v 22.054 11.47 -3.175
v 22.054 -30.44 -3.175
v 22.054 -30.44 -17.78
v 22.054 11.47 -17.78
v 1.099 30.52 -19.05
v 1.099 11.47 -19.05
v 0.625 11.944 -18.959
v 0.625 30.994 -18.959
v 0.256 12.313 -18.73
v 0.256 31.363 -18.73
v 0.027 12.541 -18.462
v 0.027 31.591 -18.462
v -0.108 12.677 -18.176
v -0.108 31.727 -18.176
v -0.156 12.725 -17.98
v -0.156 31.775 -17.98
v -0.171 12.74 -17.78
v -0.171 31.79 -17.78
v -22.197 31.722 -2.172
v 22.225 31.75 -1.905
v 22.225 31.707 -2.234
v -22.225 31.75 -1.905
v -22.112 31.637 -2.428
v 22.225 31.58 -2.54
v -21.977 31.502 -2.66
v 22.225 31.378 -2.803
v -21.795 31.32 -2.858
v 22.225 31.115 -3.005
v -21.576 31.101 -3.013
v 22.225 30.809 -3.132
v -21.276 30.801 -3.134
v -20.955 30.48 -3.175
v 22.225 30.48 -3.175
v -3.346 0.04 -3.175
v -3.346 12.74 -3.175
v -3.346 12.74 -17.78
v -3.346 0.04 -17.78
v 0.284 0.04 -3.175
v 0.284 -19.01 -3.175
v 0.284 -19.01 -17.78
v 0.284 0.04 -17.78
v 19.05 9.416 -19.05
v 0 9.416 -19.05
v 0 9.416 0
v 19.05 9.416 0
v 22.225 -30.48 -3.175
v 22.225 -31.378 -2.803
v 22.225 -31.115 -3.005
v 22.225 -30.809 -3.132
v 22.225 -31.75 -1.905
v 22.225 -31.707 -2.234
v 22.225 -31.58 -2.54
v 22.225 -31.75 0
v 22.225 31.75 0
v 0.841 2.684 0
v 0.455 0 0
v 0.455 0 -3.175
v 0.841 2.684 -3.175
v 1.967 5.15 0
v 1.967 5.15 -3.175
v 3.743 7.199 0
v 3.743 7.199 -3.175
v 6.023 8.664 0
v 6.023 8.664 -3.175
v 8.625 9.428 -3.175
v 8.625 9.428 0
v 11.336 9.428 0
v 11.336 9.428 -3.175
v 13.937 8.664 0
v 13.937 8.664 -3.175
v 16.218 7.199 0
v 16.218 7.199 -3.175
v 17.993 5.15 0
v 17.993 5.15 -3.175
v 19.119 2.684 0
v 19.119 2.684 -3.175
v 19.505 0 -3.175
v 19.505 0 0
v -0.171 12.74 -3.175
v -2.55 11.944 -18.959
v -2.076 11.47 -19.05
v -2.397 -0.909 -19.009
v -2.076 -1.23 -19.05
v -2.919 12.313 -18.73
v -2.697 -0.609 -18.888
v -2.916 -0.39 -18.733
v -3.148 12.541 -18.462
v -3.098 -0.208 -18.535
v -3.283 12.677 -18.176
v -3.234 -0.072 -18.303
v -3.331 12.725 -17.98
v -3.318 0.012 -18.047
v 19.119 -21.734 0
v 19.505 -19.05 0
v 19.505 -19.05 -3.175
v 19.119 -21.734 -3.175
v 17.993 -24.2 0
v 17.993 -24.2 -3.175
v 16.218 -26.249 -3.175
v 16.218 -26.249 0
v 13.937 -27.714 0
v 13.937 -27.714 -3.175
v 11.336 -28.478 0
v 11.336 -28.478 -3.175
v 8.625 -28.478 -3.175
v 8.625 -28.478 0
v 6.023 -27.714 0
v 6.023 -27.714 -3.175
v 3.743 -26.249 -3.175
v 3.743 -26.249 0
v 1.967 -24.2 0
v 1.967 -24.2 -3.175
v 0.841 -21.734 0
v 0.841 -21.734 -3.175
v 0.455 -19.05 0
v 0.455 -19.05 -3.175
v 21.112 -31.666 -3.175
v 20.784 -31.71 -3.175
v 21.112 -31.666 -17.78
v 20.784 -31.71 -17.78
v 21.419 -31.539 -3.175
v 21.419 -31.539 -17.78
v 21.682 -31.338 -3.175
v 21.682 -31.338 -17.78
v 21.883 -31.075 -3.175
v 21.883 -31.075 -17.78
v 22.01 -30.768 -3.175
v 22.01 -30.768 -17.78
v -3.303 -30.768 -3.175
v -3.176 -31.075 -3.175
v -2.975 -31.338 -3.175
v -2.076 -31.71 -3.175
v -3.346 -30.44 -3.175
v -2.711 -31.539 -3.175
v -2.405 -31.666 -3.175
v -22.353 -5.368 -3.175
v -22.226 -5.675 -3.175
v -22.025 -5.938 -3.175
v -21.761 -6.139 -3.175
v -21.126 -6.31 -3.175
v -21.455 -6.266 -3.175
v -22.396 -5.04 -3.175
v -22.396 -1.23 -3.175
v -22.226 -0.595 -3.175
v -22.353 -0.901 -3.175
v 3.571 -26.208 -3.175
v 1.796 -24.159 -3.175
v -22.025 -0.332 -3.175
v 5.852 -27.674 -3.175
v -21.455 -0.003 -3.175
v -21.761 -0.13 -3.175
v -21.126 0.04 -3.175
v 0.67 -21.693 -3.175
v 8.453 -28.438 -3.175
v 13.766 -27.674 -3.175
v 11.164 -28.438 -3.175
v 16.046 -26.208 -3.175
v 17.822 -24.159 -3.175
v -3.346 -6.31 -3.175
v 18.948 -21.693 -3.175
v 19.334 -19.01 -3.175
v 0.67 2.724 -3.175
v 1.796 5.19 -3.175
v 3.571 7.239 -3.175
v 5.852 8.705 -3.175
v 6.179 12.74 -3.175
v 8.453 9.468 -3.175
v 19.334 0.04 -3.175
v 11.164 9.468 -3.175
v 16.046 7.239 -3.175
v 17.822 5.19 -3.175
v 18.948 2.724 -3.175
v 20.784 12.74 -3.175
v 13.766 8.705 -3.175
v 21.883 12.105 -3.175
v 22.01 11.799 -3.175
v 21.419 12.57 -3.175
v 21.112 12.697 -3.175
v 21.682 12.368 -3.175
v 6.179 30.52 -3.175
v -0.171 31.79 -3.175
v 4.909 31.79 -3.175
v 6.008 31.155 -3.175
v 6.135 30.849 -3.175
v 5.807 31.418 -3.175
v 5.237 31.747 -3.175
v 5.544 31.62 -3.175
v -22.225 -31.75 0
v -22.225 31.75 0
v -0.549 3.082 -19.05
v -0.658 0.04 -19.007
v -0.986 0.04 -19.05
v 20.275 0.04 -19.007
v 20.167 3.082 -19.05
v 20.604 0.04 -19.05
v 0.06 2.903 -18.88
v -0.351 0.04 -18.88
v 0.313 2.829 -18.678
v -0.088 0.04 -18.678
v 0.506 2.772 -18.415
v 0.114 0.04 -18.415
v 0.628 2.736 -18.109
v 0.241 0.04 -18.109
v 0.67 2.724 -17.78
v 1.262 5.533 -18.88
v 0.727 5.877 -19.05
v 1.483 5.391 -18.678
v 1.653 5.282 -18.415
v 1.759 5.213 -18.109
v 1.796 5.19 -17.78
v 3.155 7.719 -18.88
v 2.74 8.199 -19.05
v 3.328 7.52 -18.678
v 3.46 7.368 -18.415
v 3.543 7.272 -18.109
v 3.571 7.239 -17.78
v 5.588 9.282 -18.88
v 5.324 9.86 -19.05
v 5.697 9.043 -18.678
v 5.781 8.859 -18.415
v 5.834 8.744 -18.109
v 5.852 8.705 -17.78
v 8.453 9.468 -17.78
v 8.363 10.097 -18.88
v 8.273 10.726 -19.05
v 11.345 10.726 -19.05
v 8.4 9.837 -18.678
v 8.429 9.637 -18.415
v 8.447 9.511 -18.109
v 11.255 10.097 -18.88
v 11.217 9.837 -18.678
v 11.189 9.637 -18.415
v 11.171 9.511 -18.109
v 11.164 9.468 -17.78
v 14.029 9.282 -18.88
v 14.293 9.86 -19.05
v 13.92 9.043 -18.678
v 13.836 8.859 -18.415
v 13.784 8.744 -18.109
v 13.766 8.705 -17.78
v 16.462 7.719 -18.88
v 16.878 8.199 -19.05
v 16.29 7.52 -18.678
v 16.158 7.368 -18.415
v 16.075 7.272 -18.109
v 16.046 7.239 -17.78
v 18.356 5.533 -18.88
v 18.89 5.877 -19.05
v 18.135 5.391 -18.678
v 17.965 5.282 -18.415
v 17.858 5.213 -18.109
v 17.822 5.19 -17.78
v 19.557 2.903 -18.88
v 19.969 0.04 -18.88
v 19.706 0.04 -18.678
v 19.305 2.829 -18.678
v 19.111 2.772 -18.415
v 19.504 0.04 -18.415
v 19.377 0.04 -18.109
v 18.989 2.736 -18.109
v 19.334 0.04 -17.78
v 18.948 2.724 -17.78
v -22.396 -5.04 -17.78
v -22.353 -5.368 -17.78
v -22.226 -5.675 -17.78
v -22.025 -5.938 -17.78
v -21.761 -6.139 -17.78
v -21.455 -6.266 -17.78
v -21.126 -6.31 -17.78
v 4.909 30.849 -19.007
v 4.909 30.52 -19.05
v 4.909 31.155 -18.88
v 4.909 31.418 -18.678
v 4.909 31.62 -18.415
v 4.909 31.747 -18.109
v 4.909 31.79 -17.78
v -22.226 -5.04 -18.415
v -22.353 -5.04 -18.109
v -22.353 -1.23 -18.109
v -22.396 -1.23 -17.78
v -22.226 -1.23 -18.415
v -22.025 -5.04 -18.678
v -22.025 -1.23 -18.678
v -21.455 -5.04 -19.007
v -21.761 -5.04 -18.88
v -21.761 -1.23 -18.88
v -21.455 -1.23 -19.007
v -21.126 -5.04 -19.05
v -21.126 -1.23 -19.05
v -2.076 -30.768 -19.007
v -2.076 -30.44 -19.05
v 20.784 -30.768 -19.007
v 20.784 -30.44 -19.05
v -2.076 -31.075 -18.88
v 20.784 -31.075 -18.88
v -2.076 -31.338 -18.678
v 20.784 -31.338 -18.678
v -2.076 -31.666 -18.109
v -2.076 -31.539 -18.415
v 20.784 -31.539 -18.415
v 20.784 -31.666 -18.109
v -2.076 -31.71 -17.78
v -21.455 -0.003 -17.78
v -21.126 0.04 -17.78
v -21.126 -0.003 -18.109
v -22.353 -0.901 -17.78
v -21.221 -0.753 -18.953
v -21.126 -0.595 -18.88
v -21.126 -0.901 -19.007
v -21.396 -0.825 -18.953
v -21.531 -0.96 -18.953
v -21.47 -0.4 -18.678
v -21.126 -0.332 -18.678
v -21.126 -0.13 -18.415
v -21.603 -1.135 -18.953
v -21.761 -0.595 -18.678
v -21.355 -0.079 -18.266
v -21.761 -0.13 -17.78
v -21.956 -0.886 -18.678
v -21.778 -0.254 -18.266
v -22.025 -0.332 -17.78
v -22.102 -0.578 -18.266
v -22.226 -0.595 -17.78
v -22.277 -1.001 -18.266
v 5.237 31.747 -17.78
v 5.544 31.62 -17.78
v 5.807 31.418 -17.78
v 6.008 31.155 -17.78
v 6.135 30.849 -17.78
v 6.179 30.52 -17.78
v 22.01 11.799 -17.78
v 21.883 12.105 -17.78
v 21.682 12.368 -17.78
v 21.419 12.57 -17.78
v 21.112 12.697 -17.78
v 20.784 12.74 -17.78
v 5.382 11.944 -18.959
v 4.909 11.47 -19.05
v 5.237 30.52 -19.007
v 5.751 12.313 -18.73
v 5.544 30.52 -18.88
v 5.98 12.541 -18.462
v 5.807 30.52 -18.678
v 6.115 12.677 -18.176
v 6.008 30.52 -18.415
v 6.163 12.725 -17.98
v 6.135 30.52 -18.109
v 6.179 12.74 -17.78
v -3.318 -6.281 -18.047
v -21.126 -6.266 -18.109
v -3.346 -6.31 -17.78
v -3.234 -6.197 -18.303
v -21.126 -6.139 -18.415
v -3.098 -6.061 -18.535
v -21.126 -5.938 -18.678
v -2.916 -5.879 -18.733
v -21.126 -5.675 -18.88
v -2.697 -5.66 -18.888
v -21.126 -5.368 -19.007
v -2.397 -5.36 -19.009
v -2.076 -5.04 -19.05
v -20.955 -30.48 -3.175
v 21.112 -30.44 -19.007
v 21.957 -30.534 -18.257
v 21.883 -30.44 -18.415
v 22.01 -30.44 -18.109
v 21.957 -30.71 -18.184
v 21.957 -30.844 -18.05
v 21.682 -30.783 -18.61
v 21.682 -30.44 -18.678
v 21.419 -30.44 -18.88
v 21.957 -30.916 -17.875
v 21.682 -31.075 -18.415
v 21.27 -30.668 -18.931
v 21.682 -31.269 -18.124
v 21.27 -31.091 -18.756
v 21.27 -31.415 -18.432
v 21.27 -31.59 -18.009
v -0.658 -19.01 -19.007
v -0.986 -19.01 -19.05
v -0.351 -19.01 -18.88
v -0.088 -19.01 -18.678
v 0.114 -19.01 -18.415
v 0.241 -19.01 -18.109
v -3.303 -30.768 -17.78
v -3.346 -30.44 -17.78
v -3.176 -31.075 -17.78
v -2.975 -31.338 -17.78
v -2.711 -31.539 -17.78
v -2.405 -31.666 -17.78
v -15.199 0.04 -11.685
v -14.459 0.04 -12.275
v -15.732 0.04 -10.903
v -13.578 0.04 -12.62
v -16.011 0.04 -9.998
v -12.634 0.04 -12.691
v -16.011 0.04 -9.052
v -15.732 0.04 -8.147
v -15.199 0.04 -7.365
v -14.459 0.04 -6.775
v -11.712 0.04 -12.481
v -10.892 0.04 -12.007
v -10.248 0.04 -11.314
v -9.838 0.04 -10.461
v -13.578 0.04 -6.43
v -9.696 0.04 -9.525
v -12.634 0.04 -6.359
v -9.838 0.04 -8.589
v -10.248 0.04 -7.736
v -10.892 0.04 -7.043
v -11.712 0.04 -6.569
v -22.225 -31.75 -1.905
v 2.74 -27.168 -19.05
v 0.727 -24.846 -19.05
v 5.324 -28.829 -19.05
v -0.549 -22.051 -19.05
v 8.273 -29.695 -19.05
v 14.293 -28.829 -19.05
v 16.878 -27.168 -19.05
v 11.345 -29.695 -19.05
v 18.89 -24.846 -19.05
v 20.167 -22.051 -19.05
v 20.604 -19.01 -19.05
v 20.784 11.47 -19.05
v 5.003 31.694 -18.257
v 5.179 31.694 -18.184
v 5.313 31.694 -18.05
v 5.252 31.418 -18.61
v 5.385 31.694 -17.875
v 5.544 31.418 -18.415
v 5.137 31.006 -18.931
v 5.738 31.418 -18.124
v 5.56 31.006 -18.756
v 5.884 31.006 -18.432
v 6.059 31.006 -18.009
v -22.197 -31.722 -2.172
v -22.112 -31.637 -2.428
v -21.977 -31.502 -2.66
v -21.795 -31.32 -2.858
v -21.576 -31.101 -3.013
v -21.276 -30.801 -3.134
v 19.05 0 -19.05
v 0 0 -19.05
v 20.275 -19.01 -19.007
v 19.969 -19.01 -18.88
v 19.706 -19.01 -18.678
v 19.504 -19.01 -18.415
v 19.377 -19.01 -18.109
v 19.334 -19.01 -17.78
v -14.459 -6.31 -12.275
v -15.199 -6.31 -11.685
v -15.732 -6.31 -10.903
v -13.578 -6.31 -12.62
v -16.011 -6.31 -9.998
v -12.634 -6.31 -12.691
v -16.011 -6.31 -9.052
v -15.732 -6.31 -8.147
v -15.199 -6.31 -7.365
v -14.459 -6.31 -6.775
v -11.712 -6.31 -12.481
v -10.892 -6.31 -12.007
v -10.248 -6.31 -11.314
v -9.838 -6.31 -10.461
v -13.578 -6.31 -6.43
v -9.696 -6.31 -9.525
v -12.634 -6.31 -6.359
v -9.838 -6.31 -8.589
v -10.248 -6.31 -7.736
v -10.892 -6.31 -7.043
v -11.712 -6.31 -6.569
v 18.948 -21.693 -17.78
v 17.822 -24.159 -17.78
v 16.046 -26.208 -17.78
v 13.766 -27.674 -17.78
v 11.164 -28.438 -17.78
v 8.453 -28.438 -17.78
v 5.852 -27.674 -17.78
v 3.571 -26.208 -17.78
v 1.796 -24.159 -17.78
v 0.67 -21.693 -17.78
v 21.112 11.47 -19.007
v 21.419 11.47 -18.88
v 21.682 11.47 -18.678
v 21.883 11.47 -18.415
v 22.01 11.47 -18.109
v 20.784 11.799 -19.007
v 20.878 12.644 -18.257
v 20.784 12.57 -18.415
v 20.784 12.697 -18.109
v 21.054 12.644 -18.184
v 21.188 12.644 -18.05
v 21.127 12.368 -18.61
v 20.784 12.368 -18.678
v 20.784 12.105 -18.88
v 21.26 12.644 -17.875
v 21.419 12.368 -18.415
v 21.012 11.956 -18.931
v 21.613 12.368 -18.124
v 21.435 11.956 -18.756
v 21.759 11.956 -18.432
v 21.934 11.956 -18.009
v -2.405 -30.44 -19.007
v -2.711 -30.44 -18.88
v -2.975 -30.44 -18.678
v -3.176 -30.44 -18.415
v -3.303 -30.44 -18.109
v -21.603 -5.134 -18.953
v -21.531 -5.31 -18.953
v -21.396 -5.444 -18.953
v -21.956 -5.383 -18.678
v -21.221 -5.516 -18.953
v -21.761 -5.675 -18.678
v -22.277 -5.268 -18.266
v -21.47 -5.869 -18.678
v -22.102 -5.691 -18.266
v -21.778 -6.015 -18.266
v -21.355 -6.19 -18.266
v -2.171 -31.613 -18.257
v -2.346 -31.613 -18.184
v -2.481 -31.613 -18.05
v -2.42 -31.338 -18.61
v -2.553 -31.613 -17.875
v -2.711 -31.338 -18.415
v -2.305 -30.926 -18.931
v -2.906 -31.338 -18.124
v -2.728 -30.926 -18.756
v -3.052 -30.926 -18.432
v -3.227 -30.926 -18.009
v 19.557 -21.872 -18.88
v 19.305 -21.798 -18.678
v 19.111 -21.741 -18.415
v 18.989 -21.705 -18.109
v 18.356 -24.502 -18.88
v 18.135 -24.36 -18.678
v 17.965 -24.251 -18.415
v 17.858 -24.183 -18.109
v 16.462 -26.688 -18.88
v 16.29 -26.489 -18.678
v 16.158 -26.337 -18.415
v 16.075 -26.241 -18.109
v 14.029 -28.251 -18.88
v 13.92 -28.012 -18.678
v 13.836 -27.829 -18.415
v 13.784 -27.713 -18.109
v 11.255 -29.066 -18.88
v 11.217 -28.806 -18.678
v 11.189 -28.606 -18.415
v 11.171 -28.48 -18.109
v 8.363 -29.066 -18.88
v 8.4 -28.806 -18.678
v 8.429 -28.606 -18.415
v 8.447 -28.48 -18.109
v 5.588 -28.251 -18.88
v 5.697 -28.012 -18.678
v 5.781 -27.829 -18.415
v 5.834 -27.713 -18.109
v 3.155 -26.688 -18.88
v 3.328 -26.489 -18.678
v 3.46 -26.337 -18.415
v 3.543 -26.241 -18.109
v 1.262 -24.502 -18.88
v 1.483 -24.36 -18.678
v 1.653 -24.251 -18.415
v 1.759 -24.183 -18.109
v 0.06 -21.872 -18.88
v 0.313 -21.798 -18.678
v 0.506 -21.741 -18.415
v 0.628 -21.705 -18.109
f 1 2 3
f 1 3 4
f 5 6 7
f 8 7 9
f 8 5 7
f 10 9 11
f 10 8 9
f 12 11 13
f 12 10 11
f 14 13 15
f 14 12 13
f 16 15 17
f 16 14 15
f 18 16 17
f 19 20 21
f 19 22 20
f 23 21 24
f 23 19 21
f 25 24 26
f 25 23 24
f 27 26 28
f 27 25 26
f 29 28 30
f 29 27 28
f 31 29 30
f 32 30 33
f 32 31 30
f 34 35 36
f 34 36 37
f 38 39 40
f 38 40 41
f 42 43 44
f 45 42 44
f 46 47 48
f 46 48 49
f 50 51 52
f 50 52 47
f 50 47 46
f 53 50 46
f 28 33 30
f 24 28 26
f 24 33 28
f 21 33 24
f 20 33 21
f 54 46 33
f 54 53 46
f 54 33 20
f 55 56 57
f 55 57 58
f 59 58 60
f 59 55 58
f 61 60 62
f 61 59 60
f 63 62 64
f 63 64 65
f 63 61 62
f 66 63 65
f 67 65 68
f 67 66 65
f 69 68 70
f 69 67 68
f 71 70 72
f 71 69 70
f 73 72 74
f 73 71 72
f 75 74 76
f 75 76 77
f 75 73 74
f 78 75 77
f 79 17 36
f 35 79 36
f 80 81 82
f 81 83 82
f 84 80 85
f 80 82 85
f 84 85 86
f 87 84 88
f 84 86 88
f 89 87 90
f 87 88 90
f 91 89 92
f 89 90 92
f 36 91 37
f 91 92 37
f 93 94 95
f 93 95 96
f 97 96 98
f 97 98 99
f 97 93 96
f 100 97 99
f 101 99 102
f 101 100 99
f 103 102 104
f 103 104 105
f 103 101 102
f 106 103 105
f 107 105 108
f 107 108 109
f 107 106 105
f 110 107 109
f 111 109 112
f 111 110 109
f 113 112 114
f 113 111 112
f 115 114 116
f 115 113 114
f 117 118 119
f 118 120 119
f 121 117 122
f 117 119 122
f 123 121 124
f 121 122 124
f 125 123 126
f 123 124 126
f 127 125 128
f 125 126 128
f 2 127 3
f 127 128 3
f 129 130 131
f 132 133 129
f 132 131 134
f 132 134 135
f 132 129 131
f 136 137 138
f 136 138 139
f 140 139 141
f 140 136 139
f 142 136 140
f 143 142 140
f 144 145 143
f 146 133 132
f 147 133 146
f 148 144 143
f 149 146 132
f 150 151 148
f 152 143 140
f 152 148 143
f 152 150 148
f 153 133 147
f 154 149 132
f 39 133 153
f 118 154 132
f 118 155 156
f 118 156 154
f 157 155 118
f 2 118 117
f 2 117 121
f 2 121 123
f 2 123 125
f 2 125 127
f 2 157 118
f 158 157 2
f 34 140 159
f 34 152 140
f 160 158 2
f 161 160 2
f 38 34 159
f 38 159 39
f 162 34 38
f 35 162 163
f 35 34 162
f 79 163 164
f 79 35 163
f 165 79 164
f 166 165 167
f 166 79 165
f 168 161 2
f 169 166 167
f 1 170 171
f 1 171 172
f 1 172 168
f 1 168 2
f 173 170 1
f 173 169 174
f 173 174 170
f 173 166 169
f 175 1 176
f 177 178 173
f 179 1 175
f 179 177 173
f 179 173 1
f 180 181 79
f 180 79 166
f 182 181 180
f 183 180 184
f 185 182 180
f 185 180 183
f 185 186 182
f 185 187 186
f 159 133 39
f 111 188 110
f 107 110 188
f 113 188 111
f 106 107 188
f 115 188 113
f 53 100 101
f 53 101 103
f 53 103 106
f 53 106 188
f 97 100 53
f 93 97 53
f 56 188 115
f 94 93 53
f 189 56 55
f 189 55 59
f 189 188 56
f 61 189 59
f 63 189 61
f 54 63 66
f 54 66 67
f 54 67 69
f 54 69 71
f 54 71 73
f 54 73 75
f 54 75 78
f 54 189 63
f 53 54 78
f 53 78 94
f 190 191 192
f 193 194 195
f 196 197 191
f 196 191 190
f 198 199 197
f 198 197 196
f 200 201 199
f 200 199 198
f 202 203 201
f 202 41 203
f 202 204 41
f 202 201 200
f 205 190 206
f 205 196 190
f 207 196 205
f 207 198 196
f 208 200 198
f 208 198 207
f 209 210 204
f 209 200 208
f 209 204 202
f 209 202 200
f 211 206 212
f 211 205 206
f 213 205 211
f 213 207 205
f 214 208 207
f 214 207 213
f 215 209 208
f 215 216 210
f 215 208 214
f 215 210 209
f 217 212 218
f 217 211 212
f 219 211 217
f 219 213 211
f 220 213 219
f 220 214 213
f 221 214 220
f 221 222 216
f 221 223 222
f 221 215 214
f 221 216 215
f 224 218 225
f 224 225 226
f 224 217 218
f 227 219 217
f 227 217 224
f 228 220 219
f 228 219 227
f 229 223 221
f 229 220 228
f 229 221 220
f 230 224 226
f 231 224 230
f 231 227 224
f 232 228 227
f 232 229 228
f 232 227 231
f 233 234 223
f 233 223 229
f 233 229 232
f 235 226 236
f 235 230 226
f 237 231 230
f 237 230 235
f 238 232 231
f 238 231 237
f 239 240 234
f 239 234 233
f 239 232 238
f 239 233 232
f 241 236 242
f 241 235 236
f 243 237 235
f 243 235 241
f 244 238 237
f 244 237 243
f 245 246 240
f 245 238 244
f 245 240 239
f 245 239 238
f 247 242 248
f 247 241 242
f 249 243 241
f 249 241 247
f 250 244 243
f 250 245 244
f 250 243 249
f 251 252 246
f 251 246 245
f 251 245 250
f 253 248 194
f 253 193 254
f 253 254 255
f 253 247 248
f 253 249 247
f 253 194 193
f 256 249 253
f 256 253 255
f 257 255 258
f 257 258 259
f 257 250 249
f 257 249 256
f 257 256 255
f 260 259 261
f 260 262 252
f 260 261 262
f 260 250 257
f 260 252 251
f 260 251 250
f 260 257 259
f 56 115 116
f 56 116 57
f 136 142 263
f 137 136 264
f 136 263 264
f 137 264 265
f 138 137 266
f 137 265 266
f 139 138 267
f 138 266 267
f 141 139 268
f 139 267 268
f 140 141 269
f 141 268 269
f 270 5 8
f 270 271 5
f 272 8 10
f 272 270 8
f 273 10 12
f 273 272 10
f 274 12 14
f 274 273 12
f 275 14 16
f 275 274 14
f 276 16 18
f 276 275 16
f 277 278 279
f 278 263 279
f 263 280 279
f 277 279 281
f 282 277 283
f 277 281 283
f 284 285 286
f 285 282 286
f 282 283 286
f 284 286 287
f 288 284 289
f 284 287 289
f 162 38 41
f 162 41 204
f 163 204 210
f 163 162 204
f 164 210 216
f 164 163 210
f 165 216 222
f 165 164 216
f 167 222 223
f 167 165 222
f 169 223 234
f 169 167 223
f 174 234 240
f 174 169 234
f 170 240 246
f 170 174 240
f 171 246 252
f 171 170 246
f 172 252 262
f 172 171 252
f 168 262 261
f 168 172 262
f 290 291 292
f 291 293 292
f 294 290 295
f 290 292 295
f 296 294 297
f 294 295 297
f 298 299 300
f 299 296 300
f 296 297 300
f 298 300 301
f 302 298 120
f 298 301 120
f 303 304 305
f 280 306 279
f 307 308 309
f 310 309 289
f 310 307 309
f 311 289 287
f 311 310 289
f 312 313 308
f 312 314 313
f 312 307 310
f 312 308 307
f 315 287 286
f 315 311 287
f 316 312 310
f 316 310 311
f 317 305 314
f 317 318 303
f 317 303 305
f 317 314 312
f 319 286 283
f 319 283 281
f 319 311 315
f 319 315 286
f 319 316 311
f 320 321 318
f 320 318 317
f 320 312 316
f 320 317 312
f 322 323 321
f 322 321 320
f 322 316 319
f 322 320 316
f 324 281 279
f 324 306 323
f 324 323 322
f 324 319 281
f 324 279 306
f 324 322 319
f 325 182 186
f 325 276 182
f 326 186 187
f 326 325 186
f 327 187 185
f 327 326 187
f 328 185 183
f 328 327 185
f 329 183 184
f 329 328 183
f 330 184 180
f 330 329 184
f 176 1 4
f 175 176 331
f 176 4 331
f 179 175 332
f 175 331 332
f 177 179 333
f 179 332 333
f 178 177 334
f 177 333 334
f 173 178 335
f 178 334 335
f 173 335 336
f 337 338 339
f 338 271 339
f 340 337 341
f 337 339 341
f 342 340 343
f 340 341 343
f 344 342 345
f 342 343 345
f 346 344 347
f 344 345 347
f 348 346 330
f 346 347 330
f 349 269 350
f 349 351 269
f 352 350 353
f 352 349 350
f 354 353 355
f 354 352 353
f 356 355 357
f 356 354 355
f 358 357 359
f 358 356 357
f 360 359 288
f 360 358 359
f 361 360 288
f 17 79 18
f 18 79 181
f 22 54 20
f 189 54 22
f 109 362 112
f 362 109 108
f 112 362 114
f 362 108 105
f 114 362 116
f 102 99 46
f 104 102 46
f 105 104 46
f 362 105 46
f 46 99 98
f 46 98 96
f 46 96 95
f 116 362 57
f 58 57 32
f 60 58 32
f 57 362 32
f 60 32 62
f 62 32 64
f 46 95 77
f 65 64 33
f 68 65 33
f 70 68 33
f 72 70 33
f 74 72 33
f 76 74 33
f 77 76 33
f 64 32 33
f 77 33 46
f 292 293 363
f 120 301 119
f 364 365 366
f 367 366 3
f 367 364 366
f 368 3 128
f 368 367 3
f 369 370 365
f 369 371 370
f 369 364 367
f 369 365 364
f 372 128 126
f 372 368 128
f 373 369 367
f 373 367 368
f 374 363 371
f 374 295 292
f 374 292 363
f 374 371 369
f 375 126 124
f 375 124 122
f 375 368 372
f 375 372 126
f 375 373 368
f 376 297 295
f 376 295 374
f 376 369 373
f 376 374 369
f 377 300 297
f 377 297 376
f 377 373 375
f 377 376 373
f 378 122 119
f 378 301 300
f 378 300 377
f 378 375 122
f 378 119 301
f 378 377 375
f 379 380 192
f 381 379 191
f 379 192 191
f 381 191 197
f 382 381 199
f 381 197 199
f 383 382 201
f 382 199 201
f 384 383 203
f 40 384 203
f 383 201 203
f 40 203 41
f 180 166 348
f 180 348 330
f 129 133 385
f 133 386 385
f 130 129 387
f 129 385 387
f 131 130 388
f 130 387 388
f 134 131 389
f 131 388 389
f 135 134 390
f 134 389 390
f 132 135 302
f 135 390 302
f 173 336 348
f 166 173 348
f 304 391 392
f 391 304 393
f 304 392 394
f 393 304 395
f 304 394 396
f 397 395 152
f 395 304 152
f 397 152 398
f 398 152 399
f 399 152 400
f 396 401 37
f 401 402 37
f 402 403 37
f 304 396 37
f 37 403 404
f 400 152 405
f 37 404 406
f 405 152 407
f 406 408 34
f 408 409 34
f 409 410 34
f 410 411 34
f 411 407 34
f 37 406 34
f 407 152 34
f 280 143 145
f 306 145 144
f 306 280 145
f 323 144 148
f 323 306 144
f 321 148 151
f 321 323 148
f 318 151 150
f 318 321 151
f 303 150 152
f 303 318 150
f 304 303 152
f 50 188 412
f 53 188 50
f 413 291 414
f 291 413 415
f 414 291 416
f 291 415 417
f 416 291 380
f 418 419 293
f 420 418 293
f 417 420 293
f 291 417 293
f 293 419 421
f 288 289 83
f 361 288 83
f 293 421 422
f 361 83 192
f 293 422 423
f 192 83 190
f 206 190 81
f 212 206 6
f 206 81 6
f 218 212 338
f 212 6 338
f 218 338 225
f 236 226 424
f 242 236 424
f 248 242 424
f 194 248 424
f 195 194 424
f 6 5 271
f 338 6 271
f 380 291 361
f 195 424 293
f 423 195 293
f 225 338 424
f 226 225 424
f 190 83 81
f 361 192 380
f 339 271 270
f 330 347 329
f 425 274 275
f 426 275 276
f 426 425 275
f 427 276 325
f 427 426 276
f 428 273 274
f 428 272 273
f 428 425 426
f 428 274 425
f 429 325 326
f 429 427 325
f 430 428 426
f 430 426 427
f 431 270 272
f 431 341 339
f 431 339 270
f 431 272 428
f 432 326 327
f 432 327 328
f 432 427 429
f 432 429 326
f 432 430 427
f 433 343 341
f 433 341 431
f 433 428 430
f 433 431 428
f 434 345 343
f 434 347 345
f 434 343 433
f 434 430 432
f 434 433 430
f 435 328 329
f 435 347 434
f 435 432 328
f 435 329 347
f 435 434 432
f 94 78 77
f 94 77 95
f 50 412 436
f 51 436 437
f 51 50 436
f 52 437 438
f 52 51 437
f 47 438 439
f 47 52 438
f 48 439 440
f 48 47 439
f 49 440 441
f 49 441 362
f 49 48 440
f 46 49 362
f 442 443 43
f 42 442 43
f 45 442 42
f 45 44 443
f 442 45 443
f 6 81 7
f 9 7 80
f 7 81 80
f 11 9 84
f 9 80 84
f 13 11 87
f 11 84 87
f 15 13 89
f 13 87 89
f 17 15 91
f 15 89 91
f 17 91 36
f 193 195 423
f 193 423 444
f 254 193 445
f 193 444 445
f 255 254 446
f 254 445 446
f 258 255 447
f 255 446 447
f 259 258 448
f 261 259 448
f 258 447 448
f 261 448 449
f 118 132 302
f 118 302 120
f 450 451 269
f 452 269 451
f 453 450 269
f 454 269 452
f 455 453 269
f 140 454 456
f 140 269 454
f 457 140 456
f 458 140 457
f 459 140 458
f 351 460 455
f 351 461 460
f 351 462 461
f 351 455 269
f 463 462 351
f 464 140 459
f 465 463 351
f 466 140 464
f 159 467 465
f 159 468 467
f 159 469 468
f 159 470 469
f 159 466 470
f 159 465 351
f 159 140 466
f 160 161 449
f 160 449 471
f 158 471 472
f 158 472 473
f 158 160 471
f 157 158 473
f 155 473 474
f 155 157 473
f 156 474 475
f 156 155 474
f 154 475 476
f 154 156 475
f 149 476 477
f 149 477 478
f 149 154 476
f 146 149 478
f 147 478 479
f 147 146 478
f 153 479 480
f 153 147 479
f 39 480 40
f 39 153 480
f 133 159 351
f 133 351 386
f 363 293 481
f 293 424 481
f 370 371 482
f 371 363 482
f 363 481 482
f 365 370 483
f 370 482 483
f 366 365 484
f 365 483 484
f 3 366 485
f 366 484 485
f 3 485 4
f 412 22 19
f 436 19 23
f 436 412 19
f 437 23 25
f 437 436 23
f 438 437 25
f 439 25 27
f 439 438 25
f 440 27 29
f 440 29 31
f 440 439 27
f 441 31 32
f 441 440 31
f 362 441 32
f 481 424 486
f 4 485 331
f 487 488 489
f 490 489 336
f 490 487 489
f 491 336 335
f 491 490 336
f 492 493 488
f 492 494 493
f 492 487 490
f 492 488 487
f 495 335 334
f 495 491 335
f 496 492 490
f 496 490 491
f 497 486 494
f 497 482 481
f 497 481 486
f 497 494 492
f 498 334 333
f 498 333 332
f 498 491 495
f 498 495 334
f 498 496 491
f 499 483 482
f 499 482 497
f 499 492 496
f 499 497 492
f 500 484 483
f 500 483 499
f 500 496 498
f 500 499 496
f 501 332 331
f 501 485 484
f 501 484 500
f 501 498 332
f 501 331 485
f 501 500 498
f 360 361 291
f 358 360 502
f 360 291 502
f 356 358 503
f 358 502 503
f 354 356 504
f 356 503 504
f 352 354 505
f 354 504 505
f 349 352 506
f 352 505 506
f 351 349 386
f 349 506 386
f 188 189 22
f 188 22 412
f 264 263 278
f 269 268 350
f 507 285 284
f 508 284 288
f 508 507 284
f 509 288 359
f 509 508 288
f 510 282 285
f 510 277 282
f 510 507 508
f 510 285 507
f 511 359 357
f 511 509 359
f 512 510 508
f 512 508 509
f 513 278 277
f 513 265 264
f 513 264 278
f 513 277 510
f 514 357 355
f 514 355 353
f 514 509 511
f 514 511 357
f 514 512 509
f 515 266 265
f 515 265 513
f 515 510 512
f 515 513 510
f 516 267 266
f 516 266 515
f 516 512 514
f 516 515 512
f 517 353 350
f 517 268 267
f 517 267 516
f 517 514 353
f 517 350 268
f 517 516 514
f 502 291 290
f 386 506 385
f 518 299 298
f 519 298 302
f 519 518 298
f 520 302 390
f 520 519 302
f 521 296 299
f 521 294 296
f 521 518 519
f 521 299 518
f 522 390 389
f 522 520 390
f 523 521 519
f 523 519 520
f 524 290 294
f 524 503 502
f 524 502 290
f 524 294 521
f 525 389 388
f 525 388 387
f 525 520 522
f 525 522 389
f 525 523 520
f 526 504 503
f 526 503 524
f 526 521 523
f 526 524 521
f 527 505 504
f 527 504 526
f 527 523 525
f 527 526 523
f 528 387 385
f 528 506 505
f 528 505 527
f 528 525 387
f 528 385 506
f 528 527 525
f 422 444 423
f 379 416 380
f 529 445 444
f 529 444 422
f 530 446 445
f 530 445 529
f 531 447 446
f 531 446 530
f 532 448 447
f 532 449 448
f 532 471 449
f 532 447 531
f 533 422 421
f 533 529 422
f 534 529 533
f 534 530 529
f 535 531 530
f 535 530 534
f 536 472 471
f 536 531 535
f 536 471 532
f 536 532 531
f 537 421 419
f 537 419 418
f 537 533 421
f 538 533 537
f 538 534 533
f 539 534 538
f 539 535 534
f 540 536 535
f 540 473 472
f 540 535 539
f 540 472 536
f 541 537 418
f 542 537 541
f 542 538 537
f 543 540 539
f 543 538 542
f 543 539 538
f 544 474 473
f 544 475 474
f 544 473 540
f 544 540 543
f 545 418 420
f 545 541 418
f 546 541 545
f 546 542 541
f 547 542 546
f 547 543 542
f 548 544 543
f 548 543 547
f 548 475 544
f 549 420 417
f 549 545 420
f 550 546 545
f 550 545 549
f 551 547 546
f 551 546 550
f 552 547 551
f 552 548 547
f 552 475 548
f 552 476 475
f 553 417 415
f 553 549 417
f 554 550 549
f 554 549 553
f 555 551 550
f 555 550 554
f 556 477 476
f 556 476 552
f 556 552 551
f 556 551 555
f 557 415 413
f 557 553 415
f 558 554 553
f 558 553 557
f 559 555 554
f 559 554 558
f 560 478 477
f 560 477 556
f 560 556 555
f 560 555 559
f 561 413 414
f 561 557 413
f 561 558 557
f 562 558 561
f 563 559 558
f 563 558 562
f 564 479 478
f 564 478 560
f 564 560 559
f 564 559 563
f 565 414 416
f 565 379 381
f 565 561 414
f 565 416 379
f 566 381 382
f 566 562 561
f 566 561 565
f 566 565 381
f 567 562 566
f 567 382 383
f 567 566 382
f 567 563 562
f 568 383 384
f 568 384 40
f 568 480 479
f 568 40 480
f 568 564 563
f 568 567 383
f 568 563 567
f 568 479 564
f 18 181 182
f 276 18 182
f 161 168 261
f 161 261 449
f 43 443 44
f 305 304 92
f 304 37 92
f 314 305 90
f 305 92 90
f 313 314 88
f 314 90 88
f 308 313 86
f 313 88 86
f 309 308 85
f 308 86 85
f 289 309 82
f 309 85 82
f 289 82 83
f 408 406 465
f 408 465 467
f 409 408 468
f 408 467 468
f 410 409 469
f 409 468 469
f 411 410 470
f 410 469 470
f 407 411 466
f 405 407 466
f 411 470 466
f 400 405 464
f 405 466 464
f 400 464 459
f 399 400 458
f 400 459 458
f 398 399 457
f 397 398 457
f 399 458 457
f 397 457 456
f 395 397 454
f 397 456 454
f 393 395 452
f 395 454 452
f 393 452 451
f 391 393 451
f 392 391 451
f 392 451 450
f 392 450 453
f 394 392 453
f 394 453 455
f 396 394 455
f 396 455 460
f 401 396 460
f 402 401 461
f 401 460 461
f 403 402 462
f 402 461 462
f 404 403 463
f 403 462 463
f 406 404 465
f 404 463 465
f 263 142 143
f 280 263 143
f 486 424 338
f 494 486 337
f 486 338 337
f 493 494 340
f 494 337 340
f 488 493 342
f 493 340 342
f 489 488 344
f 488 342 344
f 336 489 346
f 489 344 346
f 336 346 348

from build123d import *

# Parameters (mm, degrees)
F2_W     = 19.05
F2_H     = 25.4
F2_W_2   = 15.875
F2_H_2   = 19.05
F2_H_3   = 6.35
F2_W_3   = 6.35
F3_DEPTH = 3.175
F1_W     = 19.05
F1_H     = 6.35
F1_W_2   = 6.35
F1_H_2   = 19.05
F4_DEPTH = 15.875
F5_R     = 3.175
F6_DEPTH = 12.7
F9_DEPTH = 19.05
F10_R    = 1.27
F10_2_R  = 1.27


# Not quite as in the source:
# - a feature of the source that left no trace in its solid (it failed there, or was rolled back) is left out


with BuildPart() as f3:
    # F2 (on Top) → F3 (new body)
    with BuildSketch(Plane.XY):
        Polygon((0, 31.75), (-22.225, 31.75), (-22.225, 0), (-3.175, 0), (-3.175, 12.7), (0, 12.7), align=None)
        with Locations((-12.7, -19.05)):
            Rectangle(F2_W, F2_H)
        with Locations((14.2875, 22.225)):
            Rectangle(F2_W_2, F2_H_2)
        with Locations((-12.7, -3.175)):
            Rectangle(F2_W, F2_H_3)
        with Locations((3.175, 22.225)):
            Rectangle(F2_W_3, F2_H_2)
        Polygon((6.35, 12.7), (0, 12.7), (-3.175, 12.7), (-3.175, 0), (-3.175, -6.35), (-3.175, -31.75), (22.225, -31.75), (22.225, 12.7), align=None)
        with BuildLine():
            ThreePointArc((0.4552836776, 0), (9.9802836776, 9.525), (19.5052836776, 0))
            Line((19.5052836776, 0), (19.5052836776, -9.525))
            Line((19.5052836776, -9.525), (19.5052836776, -19.05))
            ThreePointArc((19.5052836776, -19.05), (9.9802836776, -28.575), (0.4552836776, -19.05))
            Line((0.4552836776, -19.05), (0.4552836776, -9.525))
            Line((0.4552836776, -9.525), (0.4552836776, 0))
        make_face(mode=Mode.SUBTRACT)
    extrude(amount=-F3_DEPTH)

    # F10
    f10_edges = [f3.edges().sort_by_distance(p)[0] for p in [
        (-22.225, 0, -3.175),
        (0, -31.75, -3.175),
        (0, 31.75, -3.175),
    ]]
    fillet(f10_edges, radius=F10_R)


with BuildPart() as f4:
    # F1 (on offset) → F4 (new body)
    with BuildSketch(Plane.XY.offset(-3.175)):
        with Locations((-12.8714862525, -3.1345629871)):
            Rectangle(F1_W, F1_H)
        with Locations((3.0035137475, 22.2654370129)):
            Rectangle(F1_W_2, F1_H_2)
        Polygon((6.1785137475, 12.7404370129), (-0.1714862525, 12.7404370129), (-3.3464862525, 12.7404370129), (-3.3464862525, 0.0404370129), (-3.3464862525, -6.3095629871), (-3.3464862525, -31.7095629871), (22.0535137475, -31.7095629871), (22.0535137475, 12.7404370129), align=None)
        with BuildLine():
            ThreePointArc((0.283797425, 0.0404370129), (9.808797425, 9.5654370129), (19.333797425, 0.0404370129))
            Line((19.333797425, 0.0404370129), (19.333797425, -9.4845629871))
            Line((19.333797425, -9.4845629871), (19.333797425, -19.0095629871))
            ThreePointArc((19.333797425, -19.0095629871), (9.808797425, -28.5345629871), (0.283797425, -19.0095629871))
            Line((0.283797425, -19.0095629871), (0.283797425, -9.4845629871))
            Line((0.283797425, -9.4845629871), (0.283797425, 0.0404370129))
        make_face(mode=Mode.SUBTRACT)
    extrude(amount=-F4_DEPTH)

    # F5 (on Front) → F6 (cut, symmetric)
    with BuildSketch(Plane.XZ):
        with Locations((-12.8714862525, -9.525)):
            Circle(F5_R)
    extrude(amount=F6_DEPTH, both=True, mode=Mode.SUBTRACT)

    # F10#2
    f10_2_edges = [f4.edges().sort_by_distance(p)[0] for p in [
        (-22.396486, -6.309563, -11.1125),
        (-22.396486, 0.040437, -11.1125),
        (-12.871486, 0.040437, -19.05),
        (-22.396486, -3.134563, -19.05),
        (-12.871486, -6.309563, -19.05),
        (-3.346486, -19.009563, -19.05),
        (9.353514, -31.709563, -19.05),
        (22.053514, -9.484563, -19.05),
        (14.116014, 12.740437, -19.05),
        (6.178514, 22.265437, -19.05),
        (3.003514, 31.790437, -19.05),
        (-0.171486, 22.265437, -19.05),
        (-1.758986, 12.740437, -19.05),
        (-3.346486, 6.390437, -19.05),
        (9.808797, -28.534563, -19.05),
        (0.283797, -9.484563, -19.05),
        (9.808797, 9.565437, -19.05),
        (19.333797, -9.484563, -19.05),
        (-3.346486, -31.709563, -11.1125),
        (22.053514, -31.709563, -11.1125),
        (22.053514, 12.740437, -11.1125),
        (6.178514, 31.790437, -11.1125),
    ]]
    fillet(f10_2_edges, radius=F10_2_R)


with BuildPart() as f9:
    # F7 (on Right) → F9 (new body)
    with BuildSketch(Plane.YZ):
        Polygon((9.4160083681, -19.05), (9.4160083681, 0), (0, -19.05), align=None)
    extrude(amount=F9_DEPTH)


solid = Compound([f3.part, f4.part, f9.part])
